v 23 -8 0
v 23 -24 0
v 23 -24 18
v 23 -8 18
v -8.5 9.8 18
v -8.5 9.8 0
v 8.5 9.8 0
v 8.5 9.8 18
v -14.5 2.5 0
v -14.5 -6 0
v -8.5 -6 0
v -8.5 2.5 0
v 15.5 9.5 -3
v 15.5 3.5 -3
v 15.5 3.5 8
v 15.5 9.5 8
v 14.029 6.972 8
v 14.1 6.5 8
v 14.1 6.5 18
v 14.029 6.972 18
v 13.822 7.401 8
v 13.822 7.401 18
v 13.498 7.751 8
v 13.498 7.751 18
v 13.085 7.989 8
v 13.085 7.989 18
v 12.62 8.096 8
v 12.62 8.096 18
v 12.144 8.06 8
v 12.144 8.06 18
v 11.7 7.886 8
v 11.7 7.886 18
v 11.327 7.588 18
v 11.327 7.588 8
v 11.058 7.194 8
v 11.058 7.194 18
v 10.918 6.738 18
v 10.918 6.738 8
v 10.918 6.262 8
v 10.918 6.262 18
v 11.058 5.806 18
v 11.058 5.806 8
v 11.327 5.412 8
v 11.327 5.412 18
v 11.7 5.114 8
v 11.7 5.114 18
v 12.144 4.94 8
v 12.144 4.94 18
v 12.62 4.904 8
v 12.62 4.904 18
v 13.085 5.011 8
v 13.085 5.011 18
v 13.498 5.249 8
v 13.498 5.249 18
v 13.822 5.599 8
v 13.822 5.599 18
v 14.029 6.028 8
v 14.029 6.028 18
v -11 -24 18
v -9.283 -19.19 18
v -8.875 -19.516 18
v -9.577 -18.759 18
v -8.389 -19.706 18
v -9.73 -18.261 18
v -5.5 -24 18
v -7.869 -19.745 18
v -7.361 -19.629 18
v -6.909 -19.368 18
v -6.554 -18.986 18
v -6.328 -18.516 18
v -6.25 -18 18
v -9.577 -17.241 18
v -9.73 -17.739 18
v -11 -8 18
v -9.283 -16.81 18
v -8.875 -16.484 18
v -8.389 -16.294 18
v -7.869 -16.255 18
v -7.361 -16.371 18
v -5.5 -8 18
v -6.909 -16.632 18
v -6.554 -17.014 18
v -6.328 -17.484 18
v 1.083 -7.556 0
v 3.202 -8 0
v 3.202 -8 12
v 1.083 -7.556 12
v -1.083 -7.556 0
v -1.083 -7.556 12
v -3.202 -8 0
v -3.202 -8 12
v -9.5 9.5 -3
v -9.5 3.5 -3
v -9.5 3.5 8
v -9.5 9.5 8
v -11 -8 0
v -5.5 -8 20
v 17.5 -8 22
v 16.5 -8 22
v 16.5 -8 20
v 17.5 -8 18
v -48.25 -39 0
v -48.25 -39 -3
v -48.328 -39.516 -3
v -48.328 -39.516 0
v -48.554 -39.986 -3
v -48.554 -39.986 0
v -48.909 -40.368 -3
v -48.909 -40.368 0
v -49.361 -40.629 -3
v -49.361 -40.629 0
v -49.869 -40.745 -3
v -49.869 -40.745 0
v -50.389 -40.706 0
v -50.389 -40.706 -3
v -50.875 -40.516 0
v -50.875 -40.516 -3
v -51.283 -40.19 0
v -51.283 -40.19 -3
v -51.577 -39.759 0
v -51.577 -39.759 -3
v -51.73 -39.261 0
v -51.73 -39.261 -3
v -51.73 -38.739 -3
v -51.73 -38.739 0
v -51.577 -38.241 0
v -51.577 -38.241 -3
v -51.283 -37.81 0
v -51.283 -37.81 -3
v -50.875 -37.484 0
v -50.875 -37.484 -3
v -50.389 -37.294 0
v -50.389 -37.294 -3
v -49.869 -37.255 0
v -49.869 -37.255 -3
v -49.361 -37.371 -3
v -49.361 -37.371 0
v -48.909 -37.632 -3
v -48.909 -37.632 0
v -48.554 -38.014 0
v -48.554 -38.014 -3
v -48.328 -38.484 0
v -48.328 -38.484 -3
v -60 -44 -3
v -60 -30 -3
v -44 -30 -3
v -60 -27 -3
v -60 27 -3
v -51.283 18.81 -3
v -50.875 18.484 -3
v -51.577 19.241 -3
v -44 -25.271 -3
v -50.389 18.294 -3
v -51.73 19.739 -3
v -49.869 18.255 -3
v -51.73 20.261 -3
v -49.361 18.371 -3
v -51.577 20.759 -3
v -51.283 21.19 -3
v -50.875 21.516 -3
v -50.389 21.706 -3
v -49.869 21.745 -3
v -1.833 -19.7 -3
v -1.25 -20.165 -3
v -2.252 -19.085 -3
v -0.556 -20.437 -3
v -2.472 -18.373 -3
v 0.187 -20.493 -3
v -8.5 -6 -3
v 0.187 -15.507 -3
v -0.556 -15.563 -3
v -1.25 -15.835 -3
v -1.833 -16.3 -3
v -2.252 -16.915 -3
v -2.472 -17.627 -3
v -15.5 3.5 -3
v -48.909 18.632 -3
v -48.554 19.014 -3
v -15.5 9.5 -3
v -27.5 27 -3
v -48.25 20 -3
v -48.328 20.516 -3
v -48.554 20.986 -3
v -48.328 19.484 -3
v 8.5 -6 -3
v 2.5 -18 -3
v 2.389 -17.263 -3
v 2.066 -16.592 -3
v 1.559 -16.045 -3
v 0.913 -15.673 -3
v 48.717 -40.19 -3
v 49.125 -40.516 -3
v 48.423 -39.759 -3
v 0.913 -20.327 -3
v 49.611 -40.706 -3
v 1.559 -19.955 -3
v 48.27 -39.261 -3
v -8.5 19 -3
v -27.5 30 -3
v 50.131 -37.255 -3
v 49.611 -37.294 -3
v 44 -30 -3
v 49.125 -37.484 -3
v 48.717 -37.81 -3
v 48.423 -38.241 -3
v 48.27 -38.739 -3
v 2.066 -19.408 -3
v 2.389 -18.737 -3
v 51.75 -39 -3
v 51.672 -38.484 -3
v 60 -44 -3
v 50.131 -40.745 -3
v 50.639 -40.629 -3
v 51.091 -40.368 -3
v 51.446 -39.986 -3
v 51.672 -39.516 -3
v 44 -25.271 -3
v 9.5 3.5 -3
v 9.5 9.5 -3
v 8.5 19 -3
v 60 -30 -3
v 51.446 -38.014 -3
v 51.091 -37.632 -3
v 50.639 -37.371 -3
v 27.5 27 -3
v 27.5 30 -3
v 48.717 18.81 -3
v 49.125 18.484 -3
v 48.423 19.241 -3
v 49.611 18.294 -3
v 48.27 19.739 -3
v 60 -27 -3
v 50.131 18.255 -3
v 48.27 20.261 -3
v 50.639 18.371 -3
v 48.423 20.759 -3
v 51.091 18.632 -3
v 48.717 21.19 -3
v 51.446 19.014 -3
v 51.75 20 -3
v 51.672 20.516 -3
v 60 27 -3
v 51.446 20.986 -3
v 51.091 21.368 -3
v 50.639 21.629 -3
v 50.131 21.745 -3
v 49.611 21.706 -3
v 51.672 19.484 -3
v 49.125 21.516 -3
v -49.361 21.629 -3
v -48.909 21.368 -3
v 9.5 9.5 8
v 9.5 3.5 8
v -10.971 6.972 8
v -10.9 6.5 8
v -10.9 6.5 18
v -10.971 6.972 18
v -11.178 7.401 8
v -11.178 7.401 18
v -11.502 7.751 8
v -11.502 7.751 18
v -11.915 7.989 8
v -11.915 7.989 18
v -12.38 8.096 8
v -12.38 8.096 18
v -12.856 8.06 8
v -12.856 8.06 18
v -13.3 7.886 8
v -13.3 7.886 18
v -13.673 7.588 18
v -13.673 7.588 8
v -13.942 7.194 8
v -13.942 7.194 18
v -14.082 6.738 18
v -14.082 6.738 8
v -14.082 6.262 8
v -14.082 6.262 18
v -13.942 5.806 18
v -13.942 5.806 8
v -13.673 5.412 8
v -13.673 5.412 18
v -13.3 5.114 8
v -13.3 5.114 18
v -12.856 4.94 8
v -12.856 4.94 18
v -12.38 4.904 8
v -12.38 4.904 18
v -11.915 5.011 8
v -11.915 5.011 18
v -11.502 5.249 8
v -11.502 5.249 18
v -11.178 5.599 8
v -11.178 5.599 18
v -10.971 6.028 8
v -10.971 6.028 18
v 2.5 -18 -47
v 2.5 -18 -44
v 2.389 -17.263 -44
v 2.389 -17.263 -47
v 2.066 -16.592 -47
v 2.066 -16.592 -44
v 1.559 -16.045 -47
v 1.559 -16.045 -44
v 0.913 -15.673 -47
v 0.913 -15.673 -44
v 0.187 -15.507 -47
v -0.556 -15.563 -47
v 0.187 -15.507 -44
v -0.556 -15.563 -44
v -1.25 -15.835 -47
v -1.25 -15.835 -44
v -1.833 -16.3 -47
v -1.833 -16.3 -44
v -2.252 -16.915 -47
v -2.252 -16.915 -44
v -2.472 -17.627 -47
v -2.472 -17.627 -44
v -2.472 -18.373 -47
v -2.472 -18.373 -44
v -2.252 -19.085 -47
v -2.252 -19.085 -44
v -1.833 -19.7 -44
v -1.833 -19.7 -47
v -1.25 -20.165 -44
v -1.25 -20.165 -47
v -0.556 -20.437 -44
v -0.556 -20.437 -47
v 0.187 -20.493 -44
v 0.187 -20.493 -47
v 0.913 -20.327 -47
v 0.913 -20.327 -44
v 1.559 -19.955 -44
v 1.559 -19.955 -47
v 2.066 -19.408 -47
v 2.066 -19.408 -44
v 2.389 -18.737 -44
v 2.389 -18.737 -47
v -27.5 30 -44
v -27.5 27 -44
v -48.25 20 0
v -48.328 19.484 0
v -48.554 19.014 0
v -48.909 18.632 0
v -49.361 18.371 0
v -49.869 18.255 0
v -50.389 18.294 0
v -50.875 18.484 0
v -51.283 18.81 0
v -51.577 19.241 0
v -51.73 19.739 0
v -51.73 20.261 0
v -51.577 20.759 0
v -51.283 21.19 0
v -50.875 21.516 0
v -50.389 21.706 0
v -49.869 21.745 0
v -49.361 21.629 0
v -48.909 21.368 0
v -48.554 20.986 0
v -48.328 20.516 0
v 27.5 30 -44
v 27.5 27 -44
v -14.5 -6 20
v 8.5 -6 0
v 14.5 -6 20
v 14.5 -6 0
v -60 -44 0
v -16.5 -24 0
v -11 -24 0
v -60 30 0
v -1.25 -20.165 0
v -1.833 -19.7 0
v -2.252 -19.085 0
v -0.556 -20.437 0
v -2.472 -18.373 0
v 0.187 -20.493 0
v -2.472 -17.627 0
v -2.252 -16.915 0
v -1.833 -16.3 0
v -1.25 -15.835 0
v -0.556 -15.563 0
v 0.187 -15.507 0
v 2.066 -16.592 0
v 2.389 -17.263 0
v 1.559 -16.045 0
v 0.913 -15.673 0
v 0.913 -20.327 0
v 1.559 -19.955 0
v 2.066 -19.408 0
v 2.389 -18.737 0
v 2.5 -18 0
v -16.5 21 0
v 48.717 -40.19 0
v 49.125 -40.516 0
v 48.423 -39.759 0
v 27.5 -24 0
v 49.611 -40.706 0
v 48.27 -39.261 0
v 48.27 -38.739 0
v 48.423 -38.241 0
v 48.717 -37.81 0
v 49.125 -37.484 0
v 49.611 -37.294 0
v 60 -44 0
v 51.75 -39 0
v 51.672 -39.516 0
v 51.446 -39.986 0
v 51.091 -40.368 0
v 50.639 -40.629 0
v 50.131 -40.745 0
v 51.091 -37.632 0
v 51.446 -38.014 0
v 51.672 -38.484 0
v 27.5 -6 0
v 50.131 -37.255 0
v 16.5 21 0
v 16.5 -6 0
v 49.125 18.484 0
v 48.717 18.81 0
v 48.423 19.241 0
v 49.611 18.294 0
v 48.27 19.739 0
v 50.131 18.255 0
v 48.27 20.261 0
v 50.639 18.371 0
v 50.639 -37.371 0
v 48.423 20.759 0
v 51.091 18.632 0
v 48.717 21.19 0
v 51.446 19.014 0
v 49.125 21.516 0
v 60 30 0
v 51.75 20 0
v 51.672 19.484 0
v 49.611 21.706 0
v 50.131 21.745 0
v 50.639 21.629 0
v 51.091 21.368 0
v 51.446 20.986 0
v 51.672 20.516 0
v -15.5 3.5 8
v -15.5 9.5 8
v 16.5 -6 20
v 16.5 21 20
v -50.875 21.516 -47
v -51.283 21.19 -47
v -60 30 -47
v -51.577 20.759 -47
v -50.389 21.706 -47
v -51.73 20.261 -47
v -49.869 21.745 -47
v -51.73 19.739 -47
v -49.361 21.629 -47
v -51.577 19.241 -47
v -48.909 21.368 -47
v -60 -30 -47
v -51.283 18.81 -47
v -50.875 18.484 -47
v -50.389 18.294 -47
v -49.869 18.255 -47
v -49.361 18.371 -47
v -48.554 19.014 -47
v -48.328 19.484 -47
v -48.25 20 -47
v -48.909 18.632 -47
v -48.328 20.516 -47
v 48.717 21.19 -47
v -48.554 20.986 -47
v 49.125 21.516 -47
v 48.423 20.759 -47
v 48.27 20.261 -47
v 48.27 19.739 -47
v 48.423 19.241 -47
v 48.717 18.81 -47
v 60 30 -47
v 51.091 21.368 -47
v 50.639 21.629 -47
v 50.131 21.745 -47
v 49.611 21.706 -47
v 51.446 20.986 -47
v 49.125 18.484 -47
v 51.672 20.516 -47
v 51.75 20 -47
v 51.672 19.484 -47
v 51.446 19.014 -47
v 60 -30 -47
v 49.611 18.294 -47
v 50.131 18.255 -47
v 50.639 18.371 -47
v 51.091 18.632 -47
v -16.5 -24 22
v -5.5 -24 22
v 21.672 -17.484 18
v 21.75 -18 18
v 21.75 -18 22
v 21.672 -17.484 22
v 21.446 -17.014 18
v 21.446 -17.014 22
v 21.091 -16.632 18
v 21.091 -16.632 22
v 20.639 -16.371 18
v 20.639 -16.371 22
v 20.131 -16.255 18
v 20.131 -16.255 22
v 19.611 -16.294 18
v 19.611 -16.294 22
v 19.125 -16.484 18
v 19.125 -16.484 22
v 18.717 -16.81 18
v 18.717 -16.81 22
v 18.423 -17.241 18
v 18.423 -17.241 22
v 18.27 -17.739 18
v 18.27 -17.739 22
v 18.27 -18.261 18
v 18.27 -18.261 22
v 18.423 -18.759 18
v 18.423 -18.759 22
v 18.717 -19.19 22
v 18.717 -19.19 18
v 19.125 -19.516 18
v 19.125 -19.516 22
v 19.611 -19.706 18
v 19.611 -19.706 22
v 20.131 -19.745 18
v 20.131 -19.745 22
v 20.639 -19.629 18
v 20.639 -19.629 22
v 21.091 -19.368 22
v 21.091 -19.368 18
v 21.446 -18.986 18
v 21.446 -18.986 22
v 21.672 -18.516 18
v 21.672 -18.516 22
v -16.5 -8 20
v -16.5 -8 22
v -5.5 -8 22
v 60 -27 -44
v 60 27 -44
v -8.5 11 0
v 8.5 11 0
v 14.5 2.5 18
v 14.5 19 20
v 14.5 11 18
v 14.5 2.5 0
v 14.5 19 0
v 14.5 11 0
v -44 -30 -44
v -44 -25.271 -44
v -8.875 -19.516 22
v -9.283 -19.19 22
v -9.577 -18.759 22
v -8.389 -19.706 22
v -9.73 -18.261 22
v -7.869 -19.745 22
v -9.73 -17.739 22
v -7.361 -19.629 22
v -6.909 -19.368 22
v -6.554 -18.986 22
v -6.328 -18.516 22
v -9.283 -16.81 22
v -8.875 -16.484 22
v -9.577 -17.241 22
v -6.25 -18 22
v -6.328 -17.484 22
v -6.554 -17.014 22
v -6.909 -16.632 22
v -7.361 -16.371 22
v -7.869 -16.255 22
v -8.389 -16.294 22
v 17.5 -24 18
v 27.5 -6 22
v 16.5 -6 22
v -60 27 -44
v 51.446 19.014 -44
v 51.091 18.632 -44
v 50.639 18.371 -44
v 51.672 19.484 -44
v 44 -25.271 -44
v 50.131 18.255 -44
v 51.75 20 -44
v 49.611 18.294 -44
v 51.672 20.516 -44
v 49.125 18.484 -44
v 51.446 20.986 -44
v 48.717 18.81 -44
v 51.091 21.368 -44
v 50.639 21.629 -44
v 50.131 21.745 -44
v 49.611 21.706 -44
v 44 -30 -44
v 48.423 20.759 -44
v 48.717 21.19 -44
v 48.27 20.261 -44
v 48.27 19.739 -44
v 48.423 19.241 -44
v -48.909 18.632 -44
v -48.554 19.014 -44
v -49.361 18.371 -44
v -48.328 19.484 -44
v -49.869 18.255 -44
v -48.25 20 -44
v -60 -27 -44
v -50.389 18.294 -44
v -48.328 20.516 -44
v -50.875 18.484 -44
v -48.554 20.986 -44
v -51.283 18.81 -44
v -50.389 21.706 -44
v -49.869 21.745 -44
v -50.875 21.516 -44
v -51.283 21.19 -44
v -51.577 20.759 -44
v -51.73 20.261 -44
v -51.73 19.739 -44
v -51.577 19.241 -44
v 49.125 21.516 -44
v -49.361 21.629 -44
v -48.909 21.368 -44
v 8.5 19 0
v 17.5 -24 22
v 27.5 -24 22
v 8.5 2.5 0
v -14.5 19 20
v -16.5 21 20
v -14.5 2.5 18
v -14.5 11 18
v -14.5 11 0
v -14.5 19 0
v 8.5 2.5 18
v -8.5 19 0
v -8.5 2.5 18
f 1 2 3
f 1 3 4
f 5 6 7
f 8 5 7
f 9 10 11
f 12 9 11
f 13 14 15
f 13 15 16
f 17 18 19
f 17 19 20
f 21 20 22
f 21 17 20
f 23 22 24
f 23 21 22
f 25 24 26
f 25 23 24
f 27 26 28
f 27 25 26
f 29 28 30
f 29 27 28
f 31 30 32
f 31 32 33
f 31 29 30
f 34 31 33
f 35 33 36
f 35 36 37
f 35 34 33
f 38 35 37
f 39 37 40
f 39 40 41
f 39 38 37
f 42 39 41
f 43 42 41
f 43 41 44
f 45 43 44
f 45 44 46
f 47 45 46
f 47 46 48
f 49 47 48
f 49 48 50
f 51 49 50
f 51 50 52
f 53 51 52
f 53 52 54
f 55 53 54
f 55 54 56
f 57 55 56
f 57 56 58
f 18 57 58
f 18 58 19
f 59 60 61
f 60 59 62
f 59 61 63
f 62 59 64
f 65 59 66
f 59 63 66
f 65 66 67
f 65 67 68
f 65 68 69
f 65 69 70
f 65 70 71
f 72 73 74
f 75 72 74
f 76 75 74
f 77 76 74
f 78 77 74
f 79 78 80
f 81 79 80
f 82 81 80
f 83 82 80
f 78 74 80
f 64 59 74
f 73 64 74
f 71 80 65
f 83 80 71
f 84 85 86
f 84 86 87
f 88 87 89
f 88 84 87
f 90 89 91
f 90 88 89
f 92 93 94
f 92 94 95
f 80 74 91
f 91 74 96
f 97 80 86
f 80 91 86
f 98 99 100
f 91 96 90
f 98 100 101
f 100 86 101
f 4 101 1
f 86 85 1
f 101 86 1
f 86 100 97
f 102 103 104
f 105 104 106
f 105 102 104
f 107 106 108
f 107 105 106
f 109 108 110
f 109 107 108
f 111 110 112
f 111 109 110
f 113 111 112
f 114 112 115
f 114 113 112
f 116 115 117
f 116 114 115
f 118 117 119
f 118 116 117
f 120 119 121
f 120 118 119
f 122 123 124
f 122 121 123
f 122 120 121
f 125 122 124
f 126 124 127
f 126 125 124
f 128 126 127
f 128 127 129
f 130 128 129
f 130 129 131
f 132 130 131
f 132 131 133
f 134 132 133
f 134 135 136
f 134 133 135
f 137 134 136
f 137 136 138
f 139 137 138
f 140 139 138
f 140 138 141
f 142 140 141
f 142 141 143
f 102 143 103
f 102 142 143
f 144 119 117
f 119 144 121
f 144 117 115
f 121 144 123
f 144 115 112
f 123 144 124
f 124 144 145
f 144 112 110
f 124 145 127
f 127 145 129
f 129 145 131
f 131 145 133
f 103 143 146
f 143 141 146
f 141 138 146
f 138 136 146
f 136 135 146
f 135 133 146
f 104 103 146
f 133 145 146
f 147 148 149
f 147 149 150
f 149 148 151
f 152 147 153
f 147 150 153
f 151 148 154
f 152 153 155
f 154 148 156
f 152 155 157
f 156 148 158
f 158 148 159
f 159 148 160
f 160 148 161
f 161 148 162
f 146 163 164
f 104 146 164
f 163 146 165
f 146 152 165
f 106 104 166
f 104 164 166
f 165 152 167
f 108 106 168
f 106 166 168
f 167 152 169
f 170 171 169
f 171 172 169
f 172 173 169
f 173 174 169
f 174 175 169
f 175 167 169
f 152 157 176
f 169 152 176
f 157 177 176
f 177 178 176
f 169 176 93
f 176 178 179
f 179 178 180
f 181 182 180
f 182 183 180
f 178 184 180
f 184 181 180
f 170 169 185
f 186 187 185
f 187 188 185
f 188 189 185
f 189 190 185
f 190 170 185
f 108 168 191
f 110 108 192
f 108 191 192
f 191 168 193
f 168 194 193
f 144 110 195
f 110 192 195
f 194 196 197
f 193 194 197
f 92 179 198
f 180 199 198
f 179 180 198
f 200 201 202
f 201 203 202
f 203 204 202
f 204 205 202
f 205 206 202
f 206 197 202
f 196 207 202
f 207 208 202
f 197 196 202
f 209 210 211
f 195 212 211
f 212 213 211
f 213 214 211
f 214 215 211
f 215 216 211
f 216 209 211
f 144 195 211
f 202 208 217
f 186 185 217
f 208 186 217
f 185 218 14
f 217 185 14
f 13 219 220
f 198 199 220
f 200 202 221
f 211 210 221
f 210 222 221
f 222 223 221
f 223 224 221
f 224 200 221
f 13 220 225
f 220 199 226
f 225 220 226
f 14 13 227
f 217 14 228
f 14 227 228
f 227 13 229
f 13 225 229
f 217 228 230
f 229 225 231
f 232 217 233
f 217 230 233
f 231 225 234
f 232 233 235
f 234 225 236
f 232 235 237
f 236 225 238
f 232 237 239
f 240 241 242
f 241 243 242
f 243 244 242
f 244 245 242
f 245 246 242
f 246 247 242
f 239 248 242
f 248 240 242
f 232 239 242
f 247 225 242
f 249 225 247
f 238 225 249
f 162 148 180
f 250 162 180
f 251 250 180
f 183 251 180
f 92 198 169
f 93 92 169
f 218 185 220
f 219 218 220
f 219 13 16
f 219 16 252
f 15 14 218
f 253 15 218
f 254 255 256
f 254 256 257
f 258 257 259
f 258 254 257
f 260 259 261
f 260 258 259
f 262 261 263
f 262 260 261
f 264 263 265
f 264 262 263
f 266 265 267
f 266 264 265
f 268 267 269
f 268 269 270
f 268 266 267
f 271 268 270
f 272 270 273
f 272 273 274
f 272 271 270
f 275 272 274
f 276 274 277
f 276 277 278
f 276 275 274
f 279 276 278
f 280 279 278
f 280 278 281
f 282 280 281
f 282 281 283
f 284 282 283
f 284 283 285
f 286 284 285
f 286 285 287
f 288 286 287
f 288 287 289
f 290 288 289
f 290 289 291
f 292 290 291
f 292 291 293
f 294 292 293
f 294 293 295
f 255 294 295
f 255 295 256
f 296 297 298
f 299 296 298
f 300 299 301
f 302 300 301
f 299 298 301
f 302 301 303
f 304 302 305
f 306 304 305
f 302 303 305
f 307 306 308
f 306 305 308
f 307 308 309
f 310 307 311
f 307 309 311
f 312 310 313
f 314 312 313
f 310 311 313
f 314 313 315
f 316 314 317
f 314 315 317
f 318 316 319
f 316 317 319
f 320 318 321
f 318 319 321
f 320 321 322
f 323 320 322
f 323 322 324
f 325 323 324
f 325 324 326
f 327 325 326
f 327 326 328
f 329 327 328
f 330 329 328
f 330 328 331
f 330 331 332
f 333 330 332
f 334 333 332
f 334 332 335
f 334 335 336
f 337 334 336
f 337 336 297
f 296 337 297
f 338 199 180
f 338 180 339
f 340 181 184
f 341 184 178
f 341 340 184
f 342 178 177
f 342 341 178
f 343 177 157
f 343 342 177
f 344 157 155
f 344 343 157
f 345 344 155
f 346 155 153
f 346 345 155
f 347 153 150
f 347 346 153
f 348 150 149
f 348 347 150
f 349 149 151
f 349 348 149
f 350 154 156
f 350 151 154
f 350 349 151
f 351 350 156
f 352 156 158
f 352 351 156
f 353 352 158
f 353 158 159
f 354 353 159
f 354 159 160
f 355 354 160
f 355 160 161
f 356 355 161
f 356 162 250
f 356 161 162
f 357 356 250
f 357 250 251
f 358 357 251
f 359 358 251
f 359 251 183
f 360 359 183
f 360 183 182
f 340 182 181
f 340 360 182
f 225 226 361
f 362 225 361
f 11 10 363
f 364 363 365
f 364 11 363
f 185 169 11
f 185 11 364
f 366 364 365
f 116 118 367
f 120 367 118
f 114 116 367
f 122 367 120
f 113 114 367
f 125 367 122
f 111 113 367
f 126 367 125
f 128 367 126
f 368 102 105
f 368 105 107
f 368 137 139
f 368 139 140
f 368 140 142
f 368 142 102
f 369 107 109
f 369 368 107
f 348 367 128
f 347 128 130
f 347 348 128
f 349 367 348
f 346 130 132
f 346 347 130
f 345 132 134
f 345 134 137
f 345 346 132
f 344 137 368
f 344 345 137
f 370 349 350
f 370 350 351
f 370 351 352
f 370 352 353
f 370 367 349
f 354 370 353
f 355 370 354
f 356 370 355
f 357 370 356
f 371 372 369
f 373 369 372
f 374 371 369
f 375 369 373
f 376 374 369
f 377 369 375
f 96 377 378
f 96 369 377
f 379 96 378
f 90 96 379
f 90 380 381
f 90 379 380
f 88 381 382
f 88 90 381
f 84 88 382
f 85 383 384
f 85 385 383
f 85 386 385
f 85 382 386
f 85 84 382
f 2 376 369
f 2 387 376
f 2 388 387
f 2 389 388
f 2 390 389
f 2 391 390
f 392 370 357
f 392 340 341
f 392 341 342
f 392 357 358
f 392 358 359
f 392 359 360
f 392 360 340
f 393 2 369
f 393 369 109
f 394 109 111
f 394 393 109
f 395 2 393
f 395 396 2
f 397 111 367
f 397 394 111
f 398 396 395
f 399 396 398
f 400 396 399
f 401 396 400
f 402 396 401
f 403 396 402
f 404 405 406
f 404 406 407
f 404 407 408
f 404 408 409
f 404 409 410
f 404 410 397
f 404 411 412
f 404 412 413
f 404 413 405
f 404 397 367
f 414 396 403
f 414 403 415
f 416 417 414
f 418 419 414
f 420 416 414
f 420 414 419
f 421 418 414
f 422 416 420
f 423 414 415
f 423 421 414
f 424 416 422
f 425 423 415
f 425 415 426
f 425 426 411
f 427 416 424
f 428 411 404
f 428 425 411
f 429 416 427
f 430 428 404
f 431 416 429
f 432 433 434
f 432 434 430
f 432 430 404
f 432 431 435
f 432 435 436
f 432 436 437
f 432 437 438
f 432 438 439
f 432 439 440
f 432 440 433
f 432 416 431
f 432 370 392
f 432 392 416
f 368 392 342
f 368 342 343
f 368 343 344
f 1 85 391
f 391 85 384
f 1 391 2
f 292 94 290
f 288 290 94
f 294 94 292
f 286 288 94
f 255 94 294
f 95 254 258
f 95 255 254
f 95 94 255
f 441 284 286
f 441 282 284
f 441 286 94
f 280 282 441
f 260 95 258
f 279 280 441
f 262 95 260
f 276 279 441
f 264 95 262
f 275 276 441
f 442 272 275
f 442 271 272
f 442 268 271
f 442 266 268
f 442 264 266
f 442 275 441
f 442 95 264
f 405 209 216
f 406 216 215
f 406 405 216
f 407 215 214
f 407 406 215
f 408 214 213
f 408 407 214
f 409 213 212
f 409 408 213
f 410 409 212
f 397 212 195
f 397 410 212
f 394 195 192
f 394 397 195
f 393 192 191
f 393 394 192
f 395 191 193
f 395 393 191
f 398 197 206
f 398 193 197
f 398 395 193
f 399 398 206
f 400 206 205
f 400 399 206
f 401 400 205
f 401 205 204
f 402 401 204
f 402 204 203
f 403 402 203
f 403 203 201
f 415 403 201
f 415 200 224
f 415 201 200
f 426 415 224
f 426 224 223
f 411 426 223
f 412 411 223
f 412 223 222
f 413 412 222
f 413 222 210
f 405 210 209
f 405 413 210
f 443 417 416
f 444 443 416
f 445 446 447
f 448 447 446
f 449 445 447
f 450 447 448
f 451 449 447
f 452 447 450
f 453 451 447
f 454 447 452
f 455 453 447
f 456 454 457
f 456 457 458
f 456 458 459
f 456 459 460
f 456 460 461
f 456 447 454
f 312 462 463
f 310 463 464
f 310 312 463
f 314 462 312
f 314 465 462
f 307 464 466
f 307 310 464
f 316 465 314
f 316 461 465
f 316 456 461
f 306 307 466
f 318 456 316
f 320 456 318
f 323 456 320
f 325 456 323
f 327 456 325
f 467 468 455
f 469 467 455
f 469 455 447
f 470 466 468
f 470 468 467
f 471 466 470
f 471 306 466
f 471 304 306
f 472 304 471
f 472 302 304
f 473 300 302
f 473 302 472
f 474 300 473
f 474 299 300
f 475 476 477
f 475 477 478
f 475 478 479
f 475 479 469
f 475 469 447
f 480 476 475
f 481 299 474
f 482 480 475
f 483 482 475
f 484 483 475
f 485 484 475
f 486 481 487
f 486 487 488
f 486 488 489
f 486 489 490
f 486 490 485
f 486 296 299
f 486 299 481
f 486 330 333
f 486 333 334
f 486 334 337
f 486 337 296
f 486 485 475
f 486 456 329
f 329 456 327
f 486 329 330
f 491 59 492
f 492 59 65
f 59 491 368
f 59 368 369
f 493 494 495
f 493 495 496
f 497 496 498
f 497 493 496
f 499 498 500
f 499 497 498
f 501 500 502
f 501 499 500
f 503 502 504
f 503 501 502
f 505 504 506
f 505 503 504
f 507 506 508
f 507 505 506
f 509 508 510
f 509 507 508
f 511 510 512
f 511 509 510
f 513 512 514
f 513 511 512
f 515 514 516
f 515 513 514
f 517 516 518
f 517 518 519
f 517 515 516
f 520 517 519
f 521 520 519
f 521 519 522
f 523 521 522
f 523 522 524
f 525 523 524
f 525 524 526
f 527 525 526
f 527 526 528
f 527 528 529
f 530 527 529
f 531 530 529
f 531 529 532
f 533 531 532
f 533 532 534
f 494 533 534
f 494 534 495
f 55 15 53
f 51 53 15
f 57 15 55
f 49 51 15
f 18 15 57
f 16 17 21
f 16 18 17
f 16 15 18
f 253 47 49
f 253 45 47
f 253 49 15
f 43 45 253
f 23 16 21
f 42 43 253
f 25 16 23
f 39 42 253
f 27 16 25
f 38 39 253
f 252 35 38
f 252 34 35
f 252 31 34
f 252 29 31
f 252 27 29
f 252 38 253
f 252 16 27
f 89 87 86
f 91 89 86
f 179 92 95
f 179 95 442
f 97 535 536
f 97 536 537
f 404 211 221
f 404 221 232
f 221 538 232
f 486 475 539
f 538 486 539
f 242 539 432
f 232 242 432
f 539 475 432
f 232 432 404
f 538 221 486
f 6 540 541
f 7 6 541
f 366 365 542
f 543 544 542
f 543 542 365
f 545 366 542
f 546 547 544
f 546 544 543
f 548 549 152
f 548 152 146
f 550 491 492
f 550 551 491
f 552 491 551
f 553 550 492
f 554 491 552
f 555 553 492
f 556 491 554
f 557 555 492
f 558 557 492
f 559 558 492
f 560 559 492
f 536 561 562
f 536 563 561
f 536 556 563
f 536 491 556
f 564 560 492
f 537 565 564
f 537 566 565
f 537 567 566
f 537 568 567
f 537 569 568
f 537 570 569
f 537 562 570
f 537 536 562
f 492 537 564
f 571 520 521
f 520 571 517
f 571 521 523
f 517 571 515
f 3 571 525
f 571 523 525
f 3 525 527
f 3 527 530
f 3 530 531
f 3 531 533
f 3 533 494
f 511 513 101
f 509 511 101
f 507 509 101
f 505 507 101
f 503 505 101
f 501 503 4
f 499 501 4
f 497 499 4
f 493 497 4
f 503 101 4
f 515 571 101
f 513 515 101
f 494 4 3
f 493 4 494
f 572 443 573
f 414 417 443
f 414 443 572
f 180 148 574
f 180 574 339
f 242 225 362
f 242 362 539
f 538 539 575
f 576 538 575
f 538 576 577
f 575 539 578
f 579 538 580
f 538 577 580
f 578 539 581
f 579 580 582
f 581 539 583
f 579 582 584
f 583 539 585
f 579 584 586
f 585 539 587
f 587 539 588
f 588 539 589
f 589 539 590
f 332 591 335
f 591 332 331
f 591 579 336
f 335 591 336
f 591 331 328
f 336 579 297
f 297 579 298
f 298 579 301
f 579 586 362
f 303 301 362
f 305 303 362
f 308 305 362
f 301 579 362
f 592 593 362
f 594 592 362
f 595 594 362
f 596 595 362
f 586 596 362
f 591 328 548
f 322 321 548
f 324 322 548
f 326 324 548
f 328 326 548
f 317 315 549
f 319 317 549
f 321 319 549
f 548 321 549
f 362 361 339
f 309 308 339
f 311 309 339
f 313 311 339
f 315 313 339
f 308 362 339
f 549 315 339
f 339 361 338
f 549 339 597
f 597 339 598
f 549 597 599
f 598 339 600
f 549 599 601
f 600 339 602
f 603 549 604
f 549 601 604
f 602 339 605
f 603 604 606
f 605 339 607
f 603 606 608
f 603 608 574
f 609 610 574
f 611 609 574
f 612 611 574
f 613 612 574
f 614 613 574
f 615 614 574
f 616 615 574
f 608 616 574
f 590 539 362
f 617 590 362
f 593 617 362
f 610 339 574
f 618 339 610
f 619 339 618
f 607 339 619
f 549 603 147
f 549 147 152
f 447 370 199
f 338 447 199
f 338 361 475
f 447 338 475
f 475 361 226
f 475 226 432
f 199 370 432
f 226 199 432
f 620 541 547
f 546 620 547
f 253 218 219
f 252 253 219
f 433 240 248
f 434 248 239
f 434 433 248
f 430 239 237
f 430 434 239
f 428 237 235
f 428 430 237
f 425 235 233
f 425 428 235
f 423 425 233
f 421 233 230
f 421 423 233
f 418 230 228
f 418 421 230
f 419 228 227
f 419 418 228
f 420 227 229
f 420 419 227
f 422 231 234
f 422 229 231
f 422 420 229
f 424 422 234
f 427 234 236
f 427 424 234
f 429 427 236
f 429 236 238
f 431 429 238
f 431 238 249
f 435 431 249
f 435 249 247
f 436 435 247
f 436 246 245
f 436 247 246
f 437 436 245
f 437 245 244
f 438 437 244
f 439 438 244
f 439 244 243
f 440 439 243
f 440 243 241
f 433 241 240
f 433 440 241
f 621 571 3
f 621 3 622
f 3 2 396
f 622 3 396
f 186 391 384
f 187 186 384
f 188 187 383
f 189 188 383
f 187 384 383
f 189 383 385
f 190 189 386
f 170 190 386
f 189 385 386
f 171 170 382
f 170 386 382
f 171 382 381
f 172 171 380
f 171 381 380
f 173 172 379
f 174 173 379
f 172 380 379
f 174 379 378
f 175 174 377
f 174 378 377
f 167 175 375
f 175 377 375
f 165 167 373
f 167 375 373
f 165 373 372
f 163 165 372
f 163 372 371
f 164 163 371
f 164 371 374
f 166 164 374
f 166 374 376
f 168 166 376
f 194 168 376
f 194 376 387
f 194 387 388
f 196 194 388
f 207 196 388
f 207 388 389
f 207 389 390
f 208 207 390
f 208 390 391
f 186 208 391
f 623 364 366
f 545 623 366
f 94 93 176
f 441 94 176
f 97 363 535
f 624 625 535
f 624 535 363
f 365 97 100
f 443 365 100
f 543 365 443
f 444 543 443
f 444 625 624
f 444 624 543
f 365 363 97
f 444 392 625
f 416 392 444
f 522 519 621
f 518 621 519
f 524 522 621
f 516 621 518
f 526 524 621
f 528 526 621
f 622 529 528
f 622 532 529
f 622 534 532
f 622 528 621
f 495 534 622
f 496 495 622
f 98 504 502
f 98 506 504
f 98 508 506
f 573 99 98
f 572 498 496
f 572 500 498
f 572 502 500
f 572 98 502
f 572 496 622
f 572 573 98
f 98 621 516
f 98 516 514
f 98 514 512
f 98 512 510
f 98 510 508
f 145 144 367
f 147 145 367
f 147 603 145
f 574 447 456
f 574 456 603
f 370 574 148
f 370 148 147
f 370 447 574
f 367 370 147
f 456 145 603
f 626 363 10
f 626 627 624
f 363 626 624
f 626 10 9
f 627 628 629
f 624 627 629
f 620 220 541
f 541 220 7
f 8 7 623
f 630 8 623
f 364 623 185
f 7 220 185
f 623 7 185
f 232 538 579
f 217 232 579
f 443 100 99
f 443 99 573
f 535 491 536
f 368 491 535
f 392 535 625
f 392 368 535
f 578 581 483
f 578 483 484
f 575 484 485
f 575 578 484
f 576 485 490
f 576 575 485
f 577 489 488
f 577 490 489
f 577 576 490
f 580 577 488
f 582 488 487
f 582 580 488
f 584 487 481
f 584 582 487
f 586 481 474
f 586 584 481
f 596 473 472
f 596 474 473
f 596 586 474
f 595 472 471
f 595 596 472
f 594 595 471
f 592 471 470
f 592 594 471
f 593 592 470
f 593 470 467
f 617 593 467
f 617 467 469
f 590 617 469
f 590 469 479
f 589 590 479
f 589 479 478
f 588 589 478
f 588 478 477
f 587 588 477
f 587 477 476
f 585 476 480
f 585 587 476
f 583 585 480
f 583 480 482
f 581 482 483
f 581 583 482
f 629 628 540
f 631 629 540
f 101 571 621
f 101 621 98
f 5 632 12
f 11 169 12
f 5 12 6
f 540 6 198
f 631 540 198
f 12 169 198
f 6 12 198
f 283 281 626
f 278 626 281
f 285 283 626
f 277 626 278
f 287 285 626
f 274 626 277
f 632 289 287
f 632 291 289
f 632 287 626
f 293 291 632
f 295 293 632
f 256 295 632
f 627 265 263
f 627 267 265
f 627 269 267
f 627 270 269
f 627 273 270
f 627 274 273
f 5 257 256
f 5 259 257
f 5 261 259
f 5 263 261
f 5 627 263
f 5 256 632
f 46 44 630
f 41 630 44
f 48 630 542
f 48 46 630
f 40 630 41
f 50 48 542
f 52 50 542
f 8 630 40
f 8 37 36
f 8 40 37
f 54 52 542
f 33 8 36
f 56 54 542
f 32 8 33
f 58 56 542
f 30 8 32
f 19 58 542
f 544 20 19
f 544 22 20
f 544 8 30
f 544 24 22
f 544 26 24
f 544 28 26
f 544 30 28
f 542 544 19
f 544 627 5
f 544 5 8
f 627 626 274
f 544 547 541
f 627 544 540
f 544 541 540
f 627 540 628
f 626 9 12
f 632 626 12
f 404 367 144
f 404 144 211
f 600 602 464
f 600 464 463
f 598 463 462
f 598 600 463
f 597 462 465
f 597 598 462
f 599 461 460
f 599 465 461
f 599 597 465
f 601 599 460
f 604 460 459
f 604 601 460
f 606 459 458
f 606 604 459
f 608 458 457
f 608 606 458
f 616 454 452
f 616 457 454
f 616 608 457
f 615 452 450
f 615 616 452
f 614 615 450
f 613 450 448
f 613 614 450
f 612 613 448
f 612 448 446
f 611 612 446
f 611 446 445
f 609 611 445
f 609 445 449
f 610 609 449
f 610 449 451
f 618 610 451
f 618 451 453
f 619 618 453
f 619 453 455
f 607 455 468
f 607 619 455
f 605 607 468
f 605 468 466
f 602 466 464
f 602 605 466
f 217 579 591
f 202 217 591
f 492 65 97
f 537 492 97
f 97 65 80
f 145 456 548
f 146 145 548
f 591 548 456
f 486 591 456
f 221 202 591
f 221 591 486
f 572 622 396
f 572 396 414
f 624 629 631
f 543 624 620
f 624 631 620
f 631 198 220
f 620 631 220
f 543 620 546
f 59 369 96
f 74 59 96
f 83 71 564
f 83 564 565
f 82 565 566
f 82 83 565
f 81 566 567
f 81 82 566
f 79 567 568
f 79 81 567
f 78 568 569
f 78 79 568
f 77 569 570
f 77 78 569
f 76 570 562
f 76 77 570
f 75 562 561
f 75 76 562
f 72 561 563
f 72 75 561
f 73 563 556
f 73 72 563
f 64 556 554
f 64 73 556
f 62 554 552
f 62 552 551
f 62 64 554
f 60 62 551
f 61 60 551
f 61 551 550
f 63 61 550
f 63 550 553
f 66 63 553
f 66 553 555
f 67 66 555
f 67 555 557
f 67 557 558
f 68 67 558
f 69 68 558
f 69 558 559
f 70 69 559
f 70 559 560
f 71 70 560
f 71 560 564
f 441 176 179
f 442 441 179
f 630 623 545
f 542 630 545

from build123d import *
from build123d.topology import SkipClean

# Parameters (mm, degrees)
SKETCH_1_W           = 120
SKETCH_1_H           = 60
EXTRUDE_1_DEPTH      = 47
SHELL_2_T            = -3
SKETCH_2_W           = 55
SKETCH_2_H           = 41
CUT_EXTRUDE_1_DEPTH  = 3
SKETCH_5_W           = 88
SKETCH_5_H           = 41
CUT_EXTRUDE_3_DEPTH  = 10
SKETCH_6_R           = 2.5
CUT_EXTRUDE_4_DEPTH  = 82.908485519
EXTRUDE_4_REACH      = 82.225
CUT_EXTRUDE_5_REACH  = 83.908
SKETCH_9_W           = 17
SKETCH_9_H           = 25
SKETCH_10_R          = 1.6
EXTRUDE_5_DEPTH      = 18
SKETCH_13_W          = 33
SKETCH_13_H          = 29
SKETCH_13_W_2        = 29
SKETCH_13_H_2        = 25
EXTRUDE_6_DEPTH      = 2
SKETCH_14_W          = 10
SKETCH_14_H          = 16
SKETCH_14_R          = 1.75
EXTRUDE_7_DEPTH      = 22
SKETCH_15_R          = 10.5
CUT_EXTRUDE_7_DEPTH  = 12
CUT_EXTRUDE_8_DEPTH  = 6
SKETCH_19_W          = 34
SKETCH_19_H          = 16
CUT_EXTRUDE_9_DEPTH  = 18
SKETCH_16_W          = 1
SKETCH_16_H          = 16
SKETCH_16_W_2        = 11
SKETCH_16_H_2        = 2
EXTRUDE_8_DEPTH      = 22
SKETCH_20_W          = 6
SKETCH_20_H          = 6
CUT_EXTRUDE_10_DEPTH = 11
SKETCH_21_W          = 120
SKETCH_21_H          = 3
EXTRUDE_9_DEPTH      = 14
SKETCH_11_R          = 1.75
CUT_EXTRUDE_6_DEPTH  = 89.005681635


with BuildPart() as part:
    # 草图1 → 凸台-拉伸1 (new body)
    with BuildSketch(Plane(origin=(0, 0, 0), x_dir=(1, 0, 0), z_dir=(0, 0, -1))):
        Rectangle(SKETCH_1_W, SKETCH_1_H)
    extrude(amount=EXTRUDE_1_DEPTH)

    # 抽壳2
    shell_2_openings = [part.faces().sort_by_distance(p)[0] for p in [
        (60, 0, -23.5),
        (-60, 0, -23.5),
    ]]
    offset(amount=SHELL_2_T, openings=shell_2_openings, kind=Kind.INTERSECTION)

    # 草图2 → 切除-拉伸1 (cut)
    with BuildSketch(Plane(origin=(0, 30, 45), x_dir=(-1, 0, 0), z_dir=(0, -1, 0))):
        with Locations((0, 68.5)):
            Rectangle(SKETCH_2_W, SKETCH_2_H)
    extrude(amount=CUT_EXTRUDE_1_DEPTH, mode=Mode.SUBTRACT)

    # 草图5 → 切除-拉伸3 (cut)
    with BuildSketch(Plane.XZ.offset(30)):
        with Locations((0, -23.5)):
            Rectangle(SKETCH_5_W, SKETCH_5_H)
    extrude(amount=-CUT_EXTRUDE_3_DEPTH, mode=Mode.SUBTRACT)

    # 草图6 → 切除-拉伸4 (cut, through all)
    with BuildSketch(Plane.XY):
        with Locations((0, -18)):
            Circle(SKETCH_6_R)
    extrude(amount=-CUT_EXTRUDE_4_DEPTH, mode=Mode.SUBTRACT)

    # 草图8 → 凸台-拉伸4 (add, up to next)
    with BuildSketch(Plane(origin=(0, 0, -44), x_dir=(-1, 0, 0), z_dir=(0, 0, -1)), mode=Mode.PRIVATE) as extrude_4_sk1:
        Polygon((-60, -27), (-44, -25.270549885), (-44, -30), (-60, -30), align=None)
    extrude_4_tool1 = extrude(extrude_4_sk1.sketch, amount=-EXTRUDE_4_REACH, mode=Mode.PRIVATE) - part.part
    extrude_4 = extrude_4_tool1.solids().sort_by_distance((51.403338, -28.035391, -44))[0]
    add(extrude_4)

    # 镜向1: 凸台-拉伸4 across plane
    add(extrude_4.mirror(Plane(origin=(0, 0, 0), x_dir=(0, 0, 1), z_dir=(1, 0, 0))))

    # 草图9 → 切除-拉伸5 (cut, up to next)
    with BuildSketch(Plane.XY, mode=Mode.PRIVATE) as cut_extrude_5_sk1:
        with Locations((0, 6.5)):
            Rectangle(SKETCH_9_W, SKETCH_9_H)
    cut_extrude_5_tool1 = extrude(cut_extrude_5_sk1.sketch, amount=-CUT_EXTRUDE_5_REACH, mode=Mode.PRIVATE) & part.part
    add(cut_extrude_5_tool1.solids().sort_by_distance((0, 6.5, 0))[0], mode=Mode.SUBTRACT)

    # 草图10 → 凸台-拉伸5 (add)
    with BuildSketch(Plane.XY):
        Polygon((-10.5, -8), (10.5, -8), (16.5, -8), (16.5, 21), (-16.5, 21), (-16.5, -8), align=None)
        with Locations((-12.5, 6.5)):
            Circle(SKETCH_10_R, mode=Mode.SUBTRACT)
        with Locations((12.5, 6.5)):
            Circle(SKETCH_10_R, mode=Mode.SUBTRACT)
        Polygon((-8.5, 11), (14.5, 11), (14.5, 19), (-14.5, 19), (-14.5, 11), align=None, mode=Mode.SUBTRACT)
        Polygon((-8.5, 9.8), (8.5, 9.8), (8.5, 2.5), (14.5, 2.5), (14.5, -6), (-14.5, -6), (-14.5, 2.5), (-8.5, 2.5), align=None, mode=Mode.SUBTRACT)
    extrude(amount=EXTRUDE_5_DEPTH)

    # 草图13 → 凸台-拉伸6 (add)
    with BuildSketch(Plane.XY.offset(18)):
        with Locations((0, 6.5)):
            Rectangle(SKETCH_13_W, SKETCH_13_H)
        with Locations((0, 6.5)):
            Rectangle(SKETCH_13_W_2, SKETCH_13_H_2, mode=Mode.SUBTRACT)
    extrude(amount=EXTRUDE_6_DEPTH)

    # 草图14 → 凸台-拉伸7 (add)
    # profile 1 of 2: a face of its own
    with BuildSketch(Plane.XY):
        with Locations((-10.5, -16)):
            Rectangle(SKETCH_14_W, SKETCH_14_H)
        with Locations((-8, -18)):
            Circle(SKETCH_14_R, mode=Mode.SUBTRACT)
    # profile 2 of 2: a face of its own
    with BuildSketch(Plane.XY):
        with Locations((22.5, -16)):
            Rectangle(SKETCH_14_W, SKETCH_14_H)
        with Locations((20, -18)):
            Circle(SKETCH_14_R, mode=Mode.SUBTRACT)
    extrude(amount=EXTRUDE_7_DEPTH)

    # 草图15 → 切除-拉伸7 (cut)
    with BuildSketch(Plane.XY):
        with Locations((0, -18)):
            Circle(SKETCH_15_R)
    extrude(amount=CUT_EXTRUDE_7_DEPTH, mode=Mode.SUBTRACT)

    # 草图17 → 切除-拉伸8 (cut)
    with SkipClean():  # the faces are left unmerged after this step: merging them gives an invalid solid
        with BuildSketch(Plane(origin=(0, 0, 12), x_dir=(-1, 0, 0), z_dir=(0, 0, -1))):
            with BuildLine():
                Line((5.5, -9.05572809), (5.5, -24))
                Line((5.5, -24), (8.61684397, -24))
                ThreePointArc((8.61684397, -24), (10.278819808, -15.856203519), (5.5, -9.05572809))
            make_face()
        extrude(amount=-CUT_EXTRUDE_8_DEPTH, mode=Mode.SUBTRACT)

    # 草图19 → 切除-拉伸9 (cut)
    with BuildSketch(Plane.XY):
        with Locations((6, -16)):
            Rectangle(SKETCH_19_W, SKETCH_19_H)
    extrude(amount=CUT_EXTRUDE_9_DEPTH, mode=Mode.SUBTRACT)

    # 草图16 → 凸台-拉伸8 (add)
    with BuildSketch(Plane.XY):
        with Locations((-16, -16)):
            Rectangle(SKETCH_16_W, SKETCH_16_H)
        with Locations((22, -7)):
            Rectangle(SKETCH_16_W_2, SKETCH_16_H_2)
    extrude(amount=EXTRUDE_8_DEPTH)

    # 草图20 → 切除-拉伸10 (cut)
    with BuildSketch(Plane(origin=(0, 0, -3), x_dir=(-1, 0, 0), z_dir=(0, 0, -1))):
        with Locations((-12.5, 6.5)):
            Rectangle(SKETCH_20_W, SKETCH_20_H)
        with Locations((12.5, 6.5)):
            Rectangle(SKETCH_20_W, SKETCH_20_H)
    extrude(amount=-CUT_EXTRUDE_10_DEPTH, mode=Mode.SUBTRACT)

    # 草图21 → 凸台-拉伸9 (add)
    with BuildSketch(Plane.XZ.offset(30)):
        with Locations((0, -1.5)):
            Rectangle(SKETCH_21_W, SKETCH_21_H)
    extrude(amount=EXTRUDE_9_DEPTH)

    # 草图11 → 切除-拉伸6 (cut, through all)
    with BuildSketch(Plane(origin=(0, 0, 0), x_dir=(-1, 0, 0), z_dir=(0, 0, -1))):
        with Locations(Location((-50, 20, 0), (0, 0, 180))):
            Circle(SKETCH_11_R)
        with Locations(Location((50, 20, 0), (0, 0, 180))):
            Circle(SKETCH_11_R)
        with Locations(Location((-50, -39, 0), (0, 0, 180))):
            Circle(SKETCH_11_R)
        with Locations(Location((50, -39, 0), (0, 0, 180))):
            Circle(SKETCH_11_R)
    extrude(amount=CUT_EXTRUDE_6_DEPTH, mode=Mode.SUBTRACT)


solid = part.part
